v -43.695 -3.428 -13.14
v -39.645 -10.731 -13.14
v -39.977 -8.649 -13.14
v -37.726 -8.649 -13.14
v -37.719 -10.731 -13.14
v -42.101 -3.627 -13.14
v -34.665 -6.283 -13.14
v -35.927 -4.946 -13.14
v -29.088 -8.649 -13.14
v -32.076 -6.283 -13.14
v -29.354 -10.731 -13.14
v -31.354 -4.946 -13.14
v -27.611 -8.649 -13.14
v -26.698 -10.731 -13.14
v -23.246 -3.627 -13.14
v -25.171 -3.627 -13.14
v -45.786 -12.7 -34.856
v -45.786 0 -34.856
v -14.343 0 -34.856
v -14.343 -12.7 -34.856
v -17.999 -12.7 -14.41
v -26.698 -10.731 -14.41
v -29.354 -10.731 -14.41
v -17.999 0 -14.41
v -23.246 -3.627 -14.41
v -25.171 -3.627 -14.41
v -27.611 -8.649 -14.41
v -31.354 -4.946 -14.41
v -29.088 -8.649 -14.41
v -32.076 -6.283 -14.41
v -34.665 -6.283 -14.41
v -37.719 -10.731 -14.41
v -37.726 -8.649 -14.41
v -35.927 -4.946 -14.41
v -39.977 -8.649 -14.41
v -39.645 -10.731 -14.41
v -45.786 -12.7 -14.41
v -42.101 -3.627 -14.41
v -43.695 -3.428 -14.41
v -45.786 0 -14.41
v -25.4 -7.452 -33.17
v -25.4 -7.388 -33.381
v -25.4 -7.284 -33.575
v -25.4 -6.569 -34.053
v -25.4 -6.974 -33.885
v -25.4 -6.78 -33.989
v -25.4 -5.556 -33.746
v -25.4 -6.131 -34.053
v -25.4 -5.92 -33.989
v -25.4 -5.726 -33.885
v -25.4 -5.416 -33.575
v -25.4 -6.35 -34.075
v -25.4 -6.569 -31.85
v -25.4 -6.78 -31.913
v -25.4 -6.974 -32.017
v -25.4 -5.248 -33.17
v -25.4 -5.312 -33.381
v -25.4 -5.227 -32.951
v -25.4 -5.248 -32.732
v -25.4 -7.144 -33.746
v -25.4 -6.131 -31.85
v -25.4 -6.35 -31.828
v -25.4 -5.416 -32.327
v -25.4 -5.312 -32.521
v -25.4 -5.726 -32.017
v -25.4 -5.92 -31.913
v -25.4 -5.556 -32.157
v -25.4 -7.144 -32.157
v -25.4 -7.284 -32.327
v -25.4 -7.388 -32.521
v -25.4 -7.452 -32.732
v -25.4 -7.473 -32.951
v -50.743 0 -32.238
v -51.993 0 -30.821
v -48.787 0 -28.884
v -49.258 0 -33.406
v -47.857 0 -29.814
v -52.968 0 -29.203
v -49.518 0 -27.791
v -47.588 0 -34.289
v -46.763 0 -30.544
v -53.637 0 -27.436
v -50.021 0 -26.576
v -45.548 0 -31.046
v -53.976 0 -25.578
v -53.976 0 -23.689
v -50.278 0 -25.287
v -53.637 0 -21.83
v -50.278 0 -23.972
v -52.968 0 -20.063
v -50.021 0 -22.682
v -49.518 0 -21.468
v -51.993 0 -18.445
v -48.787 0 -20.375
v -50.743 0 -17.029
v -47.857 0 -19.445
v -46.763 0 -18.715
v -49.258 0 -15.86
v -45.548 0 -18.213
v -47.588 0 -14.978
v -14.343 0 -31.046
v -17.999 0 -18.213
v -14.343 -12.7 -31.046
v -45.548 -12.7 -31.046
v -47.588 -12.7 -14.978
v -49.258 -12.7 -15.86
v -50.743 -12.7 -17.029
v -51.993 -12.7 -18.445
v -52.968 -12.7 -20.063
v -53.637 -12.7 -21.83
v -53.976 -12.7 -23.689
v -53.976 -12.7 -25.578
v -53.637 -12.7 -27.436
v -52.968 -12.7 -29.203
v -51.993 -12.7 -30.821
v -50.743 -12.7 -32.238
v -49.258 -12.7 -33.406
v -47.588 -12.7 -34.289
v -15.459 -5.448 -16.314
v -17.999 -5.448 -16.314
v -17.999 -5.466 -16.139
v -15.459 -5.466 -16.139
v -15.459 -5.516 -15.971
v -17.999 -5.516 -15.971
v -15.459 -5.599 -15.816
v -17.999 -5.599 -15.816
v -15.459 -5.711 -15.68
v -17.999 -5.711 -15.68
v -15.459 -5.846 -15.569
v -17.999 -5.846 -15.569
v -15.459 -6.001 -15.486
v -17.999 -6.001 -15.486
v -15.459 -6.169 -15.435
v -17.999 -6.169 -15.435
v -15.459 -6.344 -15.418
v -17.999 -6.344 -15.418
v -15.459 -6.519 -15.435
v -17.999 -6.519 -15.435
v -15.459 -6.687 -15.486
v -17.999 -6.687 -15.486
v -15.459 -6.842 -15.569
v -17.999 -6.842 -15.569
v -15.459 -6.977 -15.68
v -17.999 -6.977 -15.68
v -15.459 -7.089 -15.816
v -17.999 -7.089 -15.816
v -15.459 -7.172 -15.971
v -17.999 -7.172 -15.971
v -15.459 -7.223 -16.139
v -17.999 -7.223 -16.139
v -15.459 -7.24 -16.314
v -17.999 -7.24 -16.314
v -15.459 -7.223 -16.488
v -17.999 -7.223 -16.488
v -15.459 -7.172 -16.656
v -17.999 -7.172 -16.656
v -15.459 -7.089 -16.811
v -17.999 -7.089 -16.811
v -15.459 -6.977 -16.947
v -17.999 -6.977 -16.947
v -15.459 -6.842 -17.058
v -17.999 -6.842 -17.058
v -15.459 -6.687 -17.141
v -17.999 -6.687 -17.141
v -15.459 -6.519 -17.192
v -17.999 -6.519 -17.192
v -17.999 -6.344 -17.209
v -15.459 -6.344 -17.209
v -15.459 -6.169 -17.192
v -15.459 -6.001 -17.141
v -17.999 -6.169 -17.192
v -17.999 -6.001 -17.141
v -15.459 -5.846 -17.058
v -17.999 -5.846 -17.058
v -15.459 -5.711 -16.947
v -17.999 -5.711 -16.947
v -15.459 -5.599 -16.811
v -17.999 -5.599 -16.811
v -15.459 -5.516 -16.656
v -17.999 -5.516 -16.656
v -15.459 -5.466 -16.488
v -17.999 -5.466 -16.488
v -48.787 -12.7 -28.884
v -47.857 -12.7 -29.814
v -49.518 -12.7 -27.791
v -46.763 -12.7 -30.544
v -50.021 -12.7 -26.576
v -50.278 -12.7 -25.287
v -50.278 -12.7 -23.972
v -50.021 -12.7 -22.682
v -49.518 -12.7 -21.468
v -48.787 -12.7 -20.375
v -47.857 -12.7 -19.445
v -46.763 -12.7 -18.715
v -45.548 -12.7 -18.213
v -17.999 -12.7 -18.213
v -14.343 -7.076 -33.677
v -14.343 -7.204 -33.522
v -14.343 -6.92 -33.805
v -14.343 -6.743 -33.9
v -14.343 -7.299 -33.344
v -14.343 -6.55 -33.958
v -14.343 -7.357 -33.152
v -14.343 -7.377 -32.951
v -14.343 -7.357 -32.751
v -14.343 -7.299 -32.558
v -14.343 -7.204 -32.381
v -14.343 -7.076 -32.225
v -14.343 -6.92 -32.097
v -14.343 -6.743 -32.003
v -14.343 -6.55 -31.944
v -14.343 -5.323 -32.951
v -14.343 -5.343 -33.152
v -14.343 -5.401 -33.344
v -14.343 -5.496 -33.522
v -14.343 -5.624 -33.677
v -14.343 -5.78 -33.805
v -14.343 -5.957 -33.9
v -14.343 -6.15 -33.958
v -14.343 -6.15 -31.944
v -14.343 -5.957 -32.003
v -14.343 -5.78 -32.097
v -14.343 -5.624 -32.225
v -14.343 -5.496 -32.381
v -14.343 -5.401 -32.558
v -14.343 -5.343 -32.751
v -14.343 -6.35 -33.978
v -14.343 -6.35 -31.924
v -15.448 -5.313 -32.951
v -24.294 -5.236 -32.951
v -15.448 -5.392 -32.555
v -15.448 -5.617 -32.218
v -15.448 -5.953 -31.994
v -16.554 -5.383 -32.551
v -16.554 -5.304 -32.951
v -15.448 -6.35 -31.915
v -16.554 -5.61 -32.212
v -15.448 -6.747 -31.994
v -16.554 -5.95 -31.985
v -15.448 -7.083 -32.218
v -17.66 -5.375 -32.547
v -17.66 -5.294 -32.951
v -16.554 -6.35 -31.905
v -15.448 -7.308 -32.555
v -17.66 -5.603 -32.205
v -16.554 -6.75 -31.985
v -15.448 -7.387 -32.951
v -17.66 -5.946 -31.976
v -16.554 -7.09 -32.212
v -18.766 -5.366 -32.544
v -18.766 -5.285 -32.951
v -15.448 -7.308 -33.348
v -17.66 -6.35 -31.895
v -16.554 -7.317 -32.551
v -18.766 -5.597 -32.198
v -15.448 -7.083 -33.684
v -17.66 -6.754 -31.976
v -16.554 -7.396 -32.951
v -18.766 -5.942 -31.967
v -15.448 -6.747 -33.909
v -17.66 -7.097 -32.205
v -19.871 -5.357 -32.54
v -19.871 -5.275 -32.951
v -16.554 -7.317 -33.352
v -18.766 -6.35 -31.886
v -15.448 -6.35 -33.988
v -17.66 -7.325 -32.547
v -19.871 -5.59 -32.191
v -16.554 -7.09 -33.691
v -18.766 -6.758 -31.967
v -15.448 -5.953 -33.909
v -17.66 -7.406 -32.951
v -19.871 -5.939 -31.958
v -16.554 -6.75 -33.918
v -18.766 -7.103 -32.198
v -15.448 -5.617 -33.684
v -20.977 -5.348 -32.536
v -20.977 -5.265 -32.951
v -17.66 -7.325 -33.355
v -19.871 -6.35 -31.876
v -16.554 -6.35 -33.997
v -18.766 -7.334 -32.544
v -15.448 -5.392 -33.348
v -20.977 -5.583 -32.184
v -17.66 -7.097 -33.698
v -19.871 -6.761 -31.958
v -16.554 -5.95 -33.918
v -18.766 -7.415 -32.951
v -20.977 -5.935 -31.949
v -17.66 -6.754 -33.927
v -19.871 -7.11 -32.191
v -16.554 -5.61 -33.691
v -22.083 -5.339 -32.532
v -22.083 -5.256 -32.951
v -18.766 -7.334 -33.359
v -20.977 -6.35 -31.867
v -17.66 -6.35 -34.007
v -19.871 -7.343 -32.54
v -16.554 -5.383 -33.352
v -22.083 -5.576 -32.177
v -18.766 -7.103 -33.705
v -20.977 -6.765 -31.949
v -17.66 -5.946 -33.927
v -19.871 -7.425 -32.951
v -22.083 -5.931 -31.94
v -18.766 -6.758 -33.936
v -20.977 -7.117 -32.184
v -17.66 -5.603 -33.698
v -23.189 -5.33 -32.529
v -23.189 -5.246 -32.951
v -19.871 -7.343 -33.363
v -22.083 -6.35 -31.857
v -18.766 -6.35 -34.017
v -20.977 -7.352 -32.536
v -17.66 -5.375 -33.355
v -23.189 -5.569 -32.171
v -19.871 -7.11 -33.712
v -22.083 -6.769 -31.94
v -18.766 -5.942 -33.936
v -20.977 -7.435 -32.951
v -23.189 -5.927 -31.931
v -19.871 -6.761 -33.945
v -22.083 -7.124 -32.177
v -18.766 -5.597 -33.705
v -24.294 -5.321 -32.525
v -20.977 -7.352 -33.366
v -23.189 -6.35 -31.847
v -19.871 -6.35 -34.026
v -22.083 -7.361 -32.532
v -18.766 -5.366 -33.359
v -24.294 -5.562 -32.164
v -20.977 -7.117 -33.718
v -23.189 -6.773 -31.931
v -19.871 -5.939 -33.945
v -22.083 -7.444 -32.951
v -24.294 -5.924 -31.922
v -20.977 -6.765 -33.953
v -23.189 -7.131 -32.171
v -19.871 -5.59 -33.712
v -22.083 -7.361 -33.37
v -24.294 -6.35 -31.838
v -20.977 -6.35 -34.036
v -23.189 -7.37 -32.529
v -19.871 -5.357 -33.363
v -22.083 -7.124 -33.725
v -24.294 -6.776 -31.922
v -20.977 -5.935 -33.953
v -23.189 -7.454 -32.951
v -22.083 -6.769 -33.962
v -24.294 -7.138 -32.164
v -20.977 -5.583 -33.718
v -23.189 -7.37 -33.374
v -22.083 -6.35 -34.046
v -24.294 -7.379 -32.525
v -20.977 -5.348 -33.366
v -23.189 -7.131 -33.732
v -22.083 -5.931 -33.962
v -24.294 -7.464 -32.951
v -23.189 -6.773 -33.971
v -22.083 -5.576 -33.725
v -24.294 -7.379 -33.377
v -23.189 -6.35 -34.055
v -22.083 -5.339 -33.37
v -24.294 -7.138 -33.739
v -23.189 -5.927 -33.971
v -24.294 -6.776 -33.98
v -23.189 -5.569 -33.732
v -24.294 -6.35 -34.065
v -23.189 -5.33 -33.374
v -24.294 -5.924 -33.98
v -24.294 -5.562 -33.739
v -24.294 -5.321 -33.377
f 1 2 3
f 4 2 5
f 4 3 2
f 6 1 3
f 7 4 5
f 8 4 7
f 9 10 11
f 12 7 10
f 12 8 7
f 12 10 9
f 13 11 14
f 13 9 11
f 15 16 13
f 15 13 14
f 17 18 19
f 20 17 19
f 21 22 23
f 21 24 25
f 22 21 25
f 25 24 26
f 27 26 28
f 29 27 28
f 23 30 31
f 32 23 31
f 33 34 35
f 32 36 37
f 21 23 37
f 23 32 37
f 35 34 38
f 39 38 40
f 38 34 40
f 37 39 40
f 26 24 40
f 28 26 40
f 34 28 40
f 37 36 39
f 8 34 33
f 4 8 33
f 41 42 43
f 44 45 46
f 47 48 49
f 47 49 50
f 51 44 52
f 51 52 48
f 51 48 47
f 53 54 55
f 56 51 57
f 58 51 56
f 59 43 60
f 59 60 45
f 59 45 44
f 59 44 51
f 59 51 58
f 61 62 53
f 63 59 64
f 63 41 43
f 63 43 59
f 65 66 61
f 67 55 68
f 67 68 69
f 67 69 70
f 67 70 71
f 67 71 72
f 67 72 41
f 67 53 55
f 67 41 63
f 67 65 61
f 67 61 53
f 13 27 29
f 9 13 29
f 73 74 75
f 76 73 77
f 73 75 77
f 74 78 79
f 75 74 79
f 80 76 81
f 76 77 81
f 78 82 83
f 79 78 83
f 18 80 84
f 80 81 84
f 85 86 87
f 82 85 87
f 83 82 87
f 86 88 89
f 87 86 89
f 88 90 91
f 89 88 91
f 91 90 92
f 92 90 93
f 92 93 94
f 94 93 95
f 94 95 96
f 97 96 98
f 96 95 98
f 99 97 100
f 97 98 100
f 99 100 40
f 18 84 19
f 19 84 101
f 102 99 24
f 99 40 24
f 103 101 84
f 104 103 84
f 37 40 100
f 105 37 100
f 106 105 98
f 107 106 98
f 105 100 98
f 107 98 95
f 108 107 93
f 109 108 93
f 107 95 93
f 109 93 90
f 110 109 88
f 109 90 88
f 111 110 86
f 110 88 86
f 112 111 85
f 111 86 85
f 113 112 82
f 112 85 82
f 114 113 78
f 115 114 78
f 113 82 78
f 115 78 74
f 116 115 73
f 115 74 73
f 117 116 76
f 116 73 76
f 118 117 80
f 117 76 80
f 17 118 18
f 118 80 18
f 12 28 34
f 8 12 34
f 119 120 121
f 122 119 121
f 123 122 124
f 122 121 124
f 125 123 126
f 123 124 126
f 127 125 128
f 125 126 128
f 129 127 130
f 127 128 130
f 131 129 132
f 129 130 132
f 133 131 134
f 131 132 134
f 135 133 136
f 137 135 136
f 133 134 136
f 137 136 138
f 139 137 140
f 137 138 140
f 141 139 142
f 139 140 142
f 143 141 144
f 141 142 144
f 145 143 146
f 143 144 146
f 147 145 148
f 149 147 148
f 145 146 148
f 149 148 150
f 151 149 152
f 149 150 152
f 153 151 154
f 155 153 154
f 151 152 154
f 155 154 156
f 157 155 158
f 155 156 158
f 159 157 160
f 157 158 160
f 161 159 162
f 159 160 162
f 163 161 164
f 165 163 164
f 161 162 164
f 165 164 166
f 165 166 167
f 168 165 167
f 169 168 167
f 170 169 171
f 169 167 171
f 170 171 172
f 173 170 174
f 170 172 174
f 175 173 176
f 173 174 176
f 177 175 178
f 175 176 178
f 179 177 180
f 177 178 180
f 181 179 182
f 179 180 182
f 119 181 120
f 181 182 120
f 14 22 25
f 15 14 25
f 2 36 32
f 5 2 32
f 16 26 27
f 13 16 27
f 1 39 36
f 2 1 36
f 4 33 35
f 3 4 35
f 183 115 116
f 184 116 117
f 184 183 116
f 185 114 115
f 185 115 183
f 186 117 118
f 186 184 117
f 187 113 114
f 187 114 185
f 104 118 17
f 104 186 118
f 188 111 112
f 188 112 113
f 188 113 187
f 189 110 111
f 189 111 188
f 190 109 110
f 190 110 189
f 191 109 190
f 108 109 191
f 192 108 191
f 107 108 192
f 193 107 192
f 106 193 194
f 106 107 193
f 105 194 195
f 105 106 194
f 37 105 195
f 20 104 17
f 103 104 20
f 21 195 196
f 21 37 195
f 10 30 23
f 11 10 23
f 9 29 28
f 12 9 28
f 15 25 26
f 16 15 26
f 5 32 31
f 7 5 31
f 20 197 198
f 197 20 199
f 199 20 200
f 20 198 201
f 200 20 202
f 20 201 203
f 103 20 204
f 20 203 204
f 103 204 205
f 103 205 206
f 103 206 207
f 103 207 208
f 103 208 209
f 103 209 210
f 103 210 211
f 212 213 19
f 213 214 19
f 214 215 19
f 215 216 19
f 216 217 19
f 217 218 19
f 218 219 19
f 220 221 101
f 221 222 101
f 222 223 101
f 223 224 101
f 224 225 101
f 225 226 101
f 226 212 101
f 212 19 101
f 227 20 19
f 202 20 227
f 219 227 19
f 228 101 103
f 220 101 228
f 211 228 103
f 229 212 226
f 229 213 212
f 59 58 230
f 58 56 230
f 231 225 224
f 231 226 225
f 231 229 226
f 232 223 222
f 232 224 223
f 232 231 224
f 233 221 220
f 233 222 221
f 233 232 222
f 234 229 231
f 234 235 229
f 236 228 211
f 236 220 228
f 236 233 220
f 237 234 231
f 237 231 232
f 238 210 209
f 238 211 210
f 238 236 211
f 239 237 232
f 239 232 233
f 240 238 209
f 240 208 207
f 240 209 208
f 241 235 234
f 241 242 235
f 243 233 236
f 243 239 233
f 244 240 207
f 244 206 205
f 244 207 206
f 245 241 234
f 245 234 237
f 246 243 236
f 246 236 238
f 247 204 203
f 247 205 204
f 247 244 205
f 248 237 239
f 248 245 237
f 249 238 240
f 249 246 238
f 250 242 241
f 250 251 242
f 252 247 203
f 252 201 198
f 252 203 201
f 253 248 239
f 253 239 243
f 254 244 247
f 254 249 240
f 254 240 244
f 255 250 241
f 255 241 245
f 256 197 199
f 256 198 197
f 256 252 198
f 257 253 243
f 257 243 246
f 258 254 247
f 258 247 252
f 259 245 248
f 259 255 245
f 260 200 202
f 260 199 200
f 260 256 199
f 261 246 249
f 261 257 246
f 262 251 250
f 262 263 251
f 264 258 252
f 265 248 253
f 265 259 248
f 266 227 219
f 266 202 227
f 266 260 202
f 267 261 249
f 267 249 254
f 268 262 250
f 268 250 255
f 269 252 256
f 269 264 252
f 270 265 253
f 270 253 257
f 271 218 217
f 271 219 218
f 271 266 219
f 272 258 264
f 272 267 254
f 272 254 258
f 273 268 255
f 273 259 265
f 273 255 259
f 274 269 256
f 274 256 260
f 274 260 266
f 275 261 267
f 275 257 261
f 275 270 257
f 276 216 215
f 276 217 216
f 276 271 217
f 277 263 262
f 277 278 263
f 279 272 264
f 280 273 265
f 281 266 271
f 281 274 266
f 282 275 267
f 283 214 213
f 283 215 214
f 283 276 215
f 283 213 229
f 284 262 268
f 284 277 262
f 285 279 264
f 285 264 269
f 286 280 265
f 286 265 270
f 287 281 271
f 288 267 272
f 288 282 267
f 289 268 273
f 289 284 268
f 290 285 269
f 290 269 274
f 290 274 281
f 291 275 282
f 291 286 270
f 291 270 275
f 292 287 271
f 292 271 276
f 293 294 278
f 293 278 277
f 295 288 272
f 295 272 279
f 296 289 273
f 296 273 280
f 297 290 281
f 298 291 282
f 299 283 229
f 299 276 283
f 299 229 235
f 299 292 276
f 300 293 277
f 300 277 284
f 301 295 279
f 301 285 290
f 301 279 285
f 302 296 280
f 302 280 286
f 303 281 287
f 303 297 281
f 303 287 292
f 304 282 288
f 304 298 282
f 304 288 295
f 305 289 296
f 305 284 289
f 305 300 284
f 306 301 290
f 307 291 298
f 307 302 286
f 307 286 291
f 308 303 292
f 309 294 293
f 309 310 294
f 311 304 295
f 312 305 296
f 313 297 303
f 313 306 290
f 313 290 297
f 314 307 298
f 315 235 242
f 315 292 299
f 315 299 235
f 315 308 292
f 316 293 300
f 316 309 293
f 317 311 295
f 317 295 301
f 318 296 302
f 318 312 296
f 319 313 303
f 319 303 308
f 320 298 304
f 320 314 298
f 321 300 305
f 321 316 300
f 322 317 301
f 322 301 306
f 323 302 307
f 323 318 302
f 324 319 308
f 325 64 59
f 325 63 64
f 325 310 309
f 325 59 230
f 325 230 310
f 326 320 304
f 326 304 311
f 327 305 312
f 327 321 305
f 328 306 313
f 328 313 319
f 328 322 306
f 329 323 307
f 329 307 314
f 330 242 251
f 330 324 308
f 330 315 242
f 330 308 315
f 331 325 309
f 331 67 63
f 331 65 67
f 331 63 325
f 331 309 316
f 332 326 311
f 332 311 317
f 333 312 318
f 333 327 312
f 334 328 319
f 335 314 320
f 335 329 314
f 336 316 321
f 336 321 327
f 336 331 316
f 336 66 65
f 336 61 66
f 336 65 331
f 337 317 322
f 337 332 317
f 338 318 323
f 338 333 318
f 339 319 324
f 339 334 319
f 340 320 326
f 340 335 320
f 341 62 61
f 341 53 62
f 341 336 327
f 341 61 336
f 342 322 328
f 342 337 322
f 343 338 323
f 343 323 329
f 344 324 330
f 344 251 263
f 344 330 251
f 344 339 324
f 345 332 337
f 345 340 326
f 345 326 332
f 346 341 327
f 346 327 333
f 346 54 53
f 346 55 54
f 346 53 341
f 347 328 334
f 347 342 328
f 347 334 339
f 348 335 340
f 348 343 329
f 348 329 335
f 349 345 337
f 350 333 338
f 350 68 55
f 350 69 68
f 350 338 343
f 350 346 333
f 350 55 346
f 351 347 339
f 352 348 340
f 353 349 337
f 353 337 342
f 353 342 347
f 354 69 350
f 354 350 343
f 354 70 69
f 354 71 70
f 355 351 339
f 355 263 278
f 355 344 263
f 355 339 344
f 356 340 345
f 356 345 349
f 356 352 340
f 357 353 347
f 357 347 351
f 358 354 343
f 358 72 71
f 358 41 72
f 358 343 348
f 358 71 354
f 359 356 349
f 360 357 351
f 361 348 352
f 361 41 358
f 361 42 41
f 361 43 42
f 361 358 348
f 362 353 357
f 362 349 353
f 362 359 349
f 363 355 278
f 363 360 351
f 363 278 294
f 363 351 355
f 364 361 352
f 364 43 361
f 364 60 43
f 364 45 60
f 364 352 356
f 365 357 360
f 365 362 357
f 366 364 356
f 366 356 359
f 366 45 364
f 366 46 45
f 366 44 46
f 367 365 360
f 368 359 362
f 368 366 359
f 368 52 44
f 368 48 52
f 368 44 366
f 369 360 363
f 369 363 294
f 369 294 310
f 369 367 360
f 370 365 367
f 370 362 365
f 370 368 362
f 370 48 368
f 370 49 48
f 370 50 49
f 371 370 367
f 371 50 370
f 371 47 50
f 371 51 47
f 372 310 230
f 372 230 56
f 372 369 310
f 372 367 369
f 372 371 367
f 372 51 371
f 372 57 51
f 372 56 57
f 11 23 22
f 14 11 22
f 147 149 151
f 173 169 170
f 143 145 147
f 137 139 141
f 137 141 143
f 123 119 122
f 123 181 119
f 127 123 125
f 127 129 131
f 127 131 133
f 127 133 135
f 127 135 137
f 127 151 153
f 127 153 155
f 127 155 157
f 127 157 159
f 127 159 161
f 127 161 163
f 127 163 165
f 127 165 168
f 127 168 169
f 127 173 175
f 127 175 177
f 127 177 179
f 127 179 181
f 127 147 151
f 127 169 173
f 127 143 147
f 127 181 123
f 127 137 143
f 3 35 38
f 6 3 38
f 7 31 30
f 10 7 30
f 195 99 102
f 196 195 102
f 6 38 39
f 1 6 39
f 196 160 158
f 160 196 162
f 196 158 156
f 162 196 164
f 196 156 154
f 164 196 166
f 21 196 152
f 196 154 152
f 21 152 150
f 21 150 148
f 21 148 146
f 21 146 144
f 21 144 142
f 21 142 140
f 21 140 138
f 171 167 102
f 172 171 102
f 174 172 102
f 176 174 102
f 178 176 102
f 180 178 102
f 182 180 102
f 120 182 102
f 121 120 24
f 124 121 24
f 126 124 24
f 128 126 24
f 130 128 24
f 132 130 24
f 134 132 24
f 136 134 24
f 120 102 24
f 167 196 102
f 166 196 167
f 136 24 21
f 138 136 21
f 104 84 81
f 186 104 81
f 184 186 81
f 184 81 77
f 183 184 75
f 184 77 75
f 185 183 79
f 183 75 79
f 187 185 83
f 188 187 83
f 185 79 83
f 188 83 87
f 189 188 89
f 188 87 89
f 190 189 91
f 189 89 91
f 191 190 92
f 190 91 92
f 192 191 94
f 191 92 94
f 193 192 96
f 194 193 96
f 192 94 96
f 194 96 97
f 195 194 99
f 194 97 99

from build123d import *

# Parameters (mm, degrees)
F1_DEPTH = 12.7
F2_R     = 0.8957594025
F3_DEPTH = 2.54
F4_R     = 0.9017
F5_DEPTH = 25.4
F5_TAPER = -0.5
F7_DEPTH = 1.27


with BuildPart() as f1:
    # F0 (on Front) → F1 (new body)
    with BuildSketch(Plane.XZ):
        Polygon((-45.7861032019, -14.4099961261), (-45.5484393347, -18.2125762878), (-17.9987344891, -18.2125762878), (-17.9987344891, -14.4099961261), align=None)
        with BuildLine():
            ThreePointArc((-45.5484393347, -31.0462834481), (-50.3102929013, -24.629429868), (-45.5484393347, -18.2125762878))
            Line((-45.5484393347, -18.2125762878), (-45.7861032019, -14.4099961261))
            ThreePointArc((-45.7861032019, -14.4099961261), (-54.0189585577, -24.6331397871), (-45.7861032019, -34.8562834481))
            Line((-45.7861032019, -34.8562834481), (-45.5484393347, -31.0462834481))
        make_face()
        Polygon((-14.3427420408, -31.0462834481), (-45.5484393347, -31.0462834481), (-45.7861032019, -34.8562834481), (-14.3427420408, -34.8562834481), align=None)
    extrude(amount=F1_DEPTH)

    # F2 (on face) → F3 (join)
    with BuildSketch(Plane.YZ.offset(-17.9987344891)):
        with Locations((-6.3440594025, -16.3135261769)):
            Circle(F2_R)
    extrude(amount=F3_DEPTH)

    # F4 (on Right) → F5 (cut)
    with BuildSketch(Plane.YZ):
        with Locations((-6.35, -32.9512834481)):
            Circle(F4_R)
    extrude(amount=-F5_DEPTH, taper=F5_TAPER, mode=Mode.SUBTRACT)

    # F6 (on face) → F7 (join)
    with BuildSketch(Plane.XY.offset(-14.4099961261)):
        Polygon((-42.1013459563, -3.627152415), (-43.6947904527, -3.4279720858), (-39.6447889507, -10.731250979), (-37.7193801105, -10.731250979), (-34.6652828157, -6.2828902155), (-32.0759378374, -6.2828902155), (-29.3538048863, -10.731250979), (-26.6980677843, -10.731250979), (-23.2456084341, -3.627152415), (-25.1710172743, -3.627152415), (-27.6113765675, -8.6486606188), (-29.0882308036, -8.6486606188), (-31.3543434693, -4.9455032606), (-35.9267555177, -4.9455032606), (-37.7264208984, -8.6486606188), (-39.9767570198, -8.6486606188), align=None)
    extrude(amount=F7_DEPTH)


solid = f1.part
